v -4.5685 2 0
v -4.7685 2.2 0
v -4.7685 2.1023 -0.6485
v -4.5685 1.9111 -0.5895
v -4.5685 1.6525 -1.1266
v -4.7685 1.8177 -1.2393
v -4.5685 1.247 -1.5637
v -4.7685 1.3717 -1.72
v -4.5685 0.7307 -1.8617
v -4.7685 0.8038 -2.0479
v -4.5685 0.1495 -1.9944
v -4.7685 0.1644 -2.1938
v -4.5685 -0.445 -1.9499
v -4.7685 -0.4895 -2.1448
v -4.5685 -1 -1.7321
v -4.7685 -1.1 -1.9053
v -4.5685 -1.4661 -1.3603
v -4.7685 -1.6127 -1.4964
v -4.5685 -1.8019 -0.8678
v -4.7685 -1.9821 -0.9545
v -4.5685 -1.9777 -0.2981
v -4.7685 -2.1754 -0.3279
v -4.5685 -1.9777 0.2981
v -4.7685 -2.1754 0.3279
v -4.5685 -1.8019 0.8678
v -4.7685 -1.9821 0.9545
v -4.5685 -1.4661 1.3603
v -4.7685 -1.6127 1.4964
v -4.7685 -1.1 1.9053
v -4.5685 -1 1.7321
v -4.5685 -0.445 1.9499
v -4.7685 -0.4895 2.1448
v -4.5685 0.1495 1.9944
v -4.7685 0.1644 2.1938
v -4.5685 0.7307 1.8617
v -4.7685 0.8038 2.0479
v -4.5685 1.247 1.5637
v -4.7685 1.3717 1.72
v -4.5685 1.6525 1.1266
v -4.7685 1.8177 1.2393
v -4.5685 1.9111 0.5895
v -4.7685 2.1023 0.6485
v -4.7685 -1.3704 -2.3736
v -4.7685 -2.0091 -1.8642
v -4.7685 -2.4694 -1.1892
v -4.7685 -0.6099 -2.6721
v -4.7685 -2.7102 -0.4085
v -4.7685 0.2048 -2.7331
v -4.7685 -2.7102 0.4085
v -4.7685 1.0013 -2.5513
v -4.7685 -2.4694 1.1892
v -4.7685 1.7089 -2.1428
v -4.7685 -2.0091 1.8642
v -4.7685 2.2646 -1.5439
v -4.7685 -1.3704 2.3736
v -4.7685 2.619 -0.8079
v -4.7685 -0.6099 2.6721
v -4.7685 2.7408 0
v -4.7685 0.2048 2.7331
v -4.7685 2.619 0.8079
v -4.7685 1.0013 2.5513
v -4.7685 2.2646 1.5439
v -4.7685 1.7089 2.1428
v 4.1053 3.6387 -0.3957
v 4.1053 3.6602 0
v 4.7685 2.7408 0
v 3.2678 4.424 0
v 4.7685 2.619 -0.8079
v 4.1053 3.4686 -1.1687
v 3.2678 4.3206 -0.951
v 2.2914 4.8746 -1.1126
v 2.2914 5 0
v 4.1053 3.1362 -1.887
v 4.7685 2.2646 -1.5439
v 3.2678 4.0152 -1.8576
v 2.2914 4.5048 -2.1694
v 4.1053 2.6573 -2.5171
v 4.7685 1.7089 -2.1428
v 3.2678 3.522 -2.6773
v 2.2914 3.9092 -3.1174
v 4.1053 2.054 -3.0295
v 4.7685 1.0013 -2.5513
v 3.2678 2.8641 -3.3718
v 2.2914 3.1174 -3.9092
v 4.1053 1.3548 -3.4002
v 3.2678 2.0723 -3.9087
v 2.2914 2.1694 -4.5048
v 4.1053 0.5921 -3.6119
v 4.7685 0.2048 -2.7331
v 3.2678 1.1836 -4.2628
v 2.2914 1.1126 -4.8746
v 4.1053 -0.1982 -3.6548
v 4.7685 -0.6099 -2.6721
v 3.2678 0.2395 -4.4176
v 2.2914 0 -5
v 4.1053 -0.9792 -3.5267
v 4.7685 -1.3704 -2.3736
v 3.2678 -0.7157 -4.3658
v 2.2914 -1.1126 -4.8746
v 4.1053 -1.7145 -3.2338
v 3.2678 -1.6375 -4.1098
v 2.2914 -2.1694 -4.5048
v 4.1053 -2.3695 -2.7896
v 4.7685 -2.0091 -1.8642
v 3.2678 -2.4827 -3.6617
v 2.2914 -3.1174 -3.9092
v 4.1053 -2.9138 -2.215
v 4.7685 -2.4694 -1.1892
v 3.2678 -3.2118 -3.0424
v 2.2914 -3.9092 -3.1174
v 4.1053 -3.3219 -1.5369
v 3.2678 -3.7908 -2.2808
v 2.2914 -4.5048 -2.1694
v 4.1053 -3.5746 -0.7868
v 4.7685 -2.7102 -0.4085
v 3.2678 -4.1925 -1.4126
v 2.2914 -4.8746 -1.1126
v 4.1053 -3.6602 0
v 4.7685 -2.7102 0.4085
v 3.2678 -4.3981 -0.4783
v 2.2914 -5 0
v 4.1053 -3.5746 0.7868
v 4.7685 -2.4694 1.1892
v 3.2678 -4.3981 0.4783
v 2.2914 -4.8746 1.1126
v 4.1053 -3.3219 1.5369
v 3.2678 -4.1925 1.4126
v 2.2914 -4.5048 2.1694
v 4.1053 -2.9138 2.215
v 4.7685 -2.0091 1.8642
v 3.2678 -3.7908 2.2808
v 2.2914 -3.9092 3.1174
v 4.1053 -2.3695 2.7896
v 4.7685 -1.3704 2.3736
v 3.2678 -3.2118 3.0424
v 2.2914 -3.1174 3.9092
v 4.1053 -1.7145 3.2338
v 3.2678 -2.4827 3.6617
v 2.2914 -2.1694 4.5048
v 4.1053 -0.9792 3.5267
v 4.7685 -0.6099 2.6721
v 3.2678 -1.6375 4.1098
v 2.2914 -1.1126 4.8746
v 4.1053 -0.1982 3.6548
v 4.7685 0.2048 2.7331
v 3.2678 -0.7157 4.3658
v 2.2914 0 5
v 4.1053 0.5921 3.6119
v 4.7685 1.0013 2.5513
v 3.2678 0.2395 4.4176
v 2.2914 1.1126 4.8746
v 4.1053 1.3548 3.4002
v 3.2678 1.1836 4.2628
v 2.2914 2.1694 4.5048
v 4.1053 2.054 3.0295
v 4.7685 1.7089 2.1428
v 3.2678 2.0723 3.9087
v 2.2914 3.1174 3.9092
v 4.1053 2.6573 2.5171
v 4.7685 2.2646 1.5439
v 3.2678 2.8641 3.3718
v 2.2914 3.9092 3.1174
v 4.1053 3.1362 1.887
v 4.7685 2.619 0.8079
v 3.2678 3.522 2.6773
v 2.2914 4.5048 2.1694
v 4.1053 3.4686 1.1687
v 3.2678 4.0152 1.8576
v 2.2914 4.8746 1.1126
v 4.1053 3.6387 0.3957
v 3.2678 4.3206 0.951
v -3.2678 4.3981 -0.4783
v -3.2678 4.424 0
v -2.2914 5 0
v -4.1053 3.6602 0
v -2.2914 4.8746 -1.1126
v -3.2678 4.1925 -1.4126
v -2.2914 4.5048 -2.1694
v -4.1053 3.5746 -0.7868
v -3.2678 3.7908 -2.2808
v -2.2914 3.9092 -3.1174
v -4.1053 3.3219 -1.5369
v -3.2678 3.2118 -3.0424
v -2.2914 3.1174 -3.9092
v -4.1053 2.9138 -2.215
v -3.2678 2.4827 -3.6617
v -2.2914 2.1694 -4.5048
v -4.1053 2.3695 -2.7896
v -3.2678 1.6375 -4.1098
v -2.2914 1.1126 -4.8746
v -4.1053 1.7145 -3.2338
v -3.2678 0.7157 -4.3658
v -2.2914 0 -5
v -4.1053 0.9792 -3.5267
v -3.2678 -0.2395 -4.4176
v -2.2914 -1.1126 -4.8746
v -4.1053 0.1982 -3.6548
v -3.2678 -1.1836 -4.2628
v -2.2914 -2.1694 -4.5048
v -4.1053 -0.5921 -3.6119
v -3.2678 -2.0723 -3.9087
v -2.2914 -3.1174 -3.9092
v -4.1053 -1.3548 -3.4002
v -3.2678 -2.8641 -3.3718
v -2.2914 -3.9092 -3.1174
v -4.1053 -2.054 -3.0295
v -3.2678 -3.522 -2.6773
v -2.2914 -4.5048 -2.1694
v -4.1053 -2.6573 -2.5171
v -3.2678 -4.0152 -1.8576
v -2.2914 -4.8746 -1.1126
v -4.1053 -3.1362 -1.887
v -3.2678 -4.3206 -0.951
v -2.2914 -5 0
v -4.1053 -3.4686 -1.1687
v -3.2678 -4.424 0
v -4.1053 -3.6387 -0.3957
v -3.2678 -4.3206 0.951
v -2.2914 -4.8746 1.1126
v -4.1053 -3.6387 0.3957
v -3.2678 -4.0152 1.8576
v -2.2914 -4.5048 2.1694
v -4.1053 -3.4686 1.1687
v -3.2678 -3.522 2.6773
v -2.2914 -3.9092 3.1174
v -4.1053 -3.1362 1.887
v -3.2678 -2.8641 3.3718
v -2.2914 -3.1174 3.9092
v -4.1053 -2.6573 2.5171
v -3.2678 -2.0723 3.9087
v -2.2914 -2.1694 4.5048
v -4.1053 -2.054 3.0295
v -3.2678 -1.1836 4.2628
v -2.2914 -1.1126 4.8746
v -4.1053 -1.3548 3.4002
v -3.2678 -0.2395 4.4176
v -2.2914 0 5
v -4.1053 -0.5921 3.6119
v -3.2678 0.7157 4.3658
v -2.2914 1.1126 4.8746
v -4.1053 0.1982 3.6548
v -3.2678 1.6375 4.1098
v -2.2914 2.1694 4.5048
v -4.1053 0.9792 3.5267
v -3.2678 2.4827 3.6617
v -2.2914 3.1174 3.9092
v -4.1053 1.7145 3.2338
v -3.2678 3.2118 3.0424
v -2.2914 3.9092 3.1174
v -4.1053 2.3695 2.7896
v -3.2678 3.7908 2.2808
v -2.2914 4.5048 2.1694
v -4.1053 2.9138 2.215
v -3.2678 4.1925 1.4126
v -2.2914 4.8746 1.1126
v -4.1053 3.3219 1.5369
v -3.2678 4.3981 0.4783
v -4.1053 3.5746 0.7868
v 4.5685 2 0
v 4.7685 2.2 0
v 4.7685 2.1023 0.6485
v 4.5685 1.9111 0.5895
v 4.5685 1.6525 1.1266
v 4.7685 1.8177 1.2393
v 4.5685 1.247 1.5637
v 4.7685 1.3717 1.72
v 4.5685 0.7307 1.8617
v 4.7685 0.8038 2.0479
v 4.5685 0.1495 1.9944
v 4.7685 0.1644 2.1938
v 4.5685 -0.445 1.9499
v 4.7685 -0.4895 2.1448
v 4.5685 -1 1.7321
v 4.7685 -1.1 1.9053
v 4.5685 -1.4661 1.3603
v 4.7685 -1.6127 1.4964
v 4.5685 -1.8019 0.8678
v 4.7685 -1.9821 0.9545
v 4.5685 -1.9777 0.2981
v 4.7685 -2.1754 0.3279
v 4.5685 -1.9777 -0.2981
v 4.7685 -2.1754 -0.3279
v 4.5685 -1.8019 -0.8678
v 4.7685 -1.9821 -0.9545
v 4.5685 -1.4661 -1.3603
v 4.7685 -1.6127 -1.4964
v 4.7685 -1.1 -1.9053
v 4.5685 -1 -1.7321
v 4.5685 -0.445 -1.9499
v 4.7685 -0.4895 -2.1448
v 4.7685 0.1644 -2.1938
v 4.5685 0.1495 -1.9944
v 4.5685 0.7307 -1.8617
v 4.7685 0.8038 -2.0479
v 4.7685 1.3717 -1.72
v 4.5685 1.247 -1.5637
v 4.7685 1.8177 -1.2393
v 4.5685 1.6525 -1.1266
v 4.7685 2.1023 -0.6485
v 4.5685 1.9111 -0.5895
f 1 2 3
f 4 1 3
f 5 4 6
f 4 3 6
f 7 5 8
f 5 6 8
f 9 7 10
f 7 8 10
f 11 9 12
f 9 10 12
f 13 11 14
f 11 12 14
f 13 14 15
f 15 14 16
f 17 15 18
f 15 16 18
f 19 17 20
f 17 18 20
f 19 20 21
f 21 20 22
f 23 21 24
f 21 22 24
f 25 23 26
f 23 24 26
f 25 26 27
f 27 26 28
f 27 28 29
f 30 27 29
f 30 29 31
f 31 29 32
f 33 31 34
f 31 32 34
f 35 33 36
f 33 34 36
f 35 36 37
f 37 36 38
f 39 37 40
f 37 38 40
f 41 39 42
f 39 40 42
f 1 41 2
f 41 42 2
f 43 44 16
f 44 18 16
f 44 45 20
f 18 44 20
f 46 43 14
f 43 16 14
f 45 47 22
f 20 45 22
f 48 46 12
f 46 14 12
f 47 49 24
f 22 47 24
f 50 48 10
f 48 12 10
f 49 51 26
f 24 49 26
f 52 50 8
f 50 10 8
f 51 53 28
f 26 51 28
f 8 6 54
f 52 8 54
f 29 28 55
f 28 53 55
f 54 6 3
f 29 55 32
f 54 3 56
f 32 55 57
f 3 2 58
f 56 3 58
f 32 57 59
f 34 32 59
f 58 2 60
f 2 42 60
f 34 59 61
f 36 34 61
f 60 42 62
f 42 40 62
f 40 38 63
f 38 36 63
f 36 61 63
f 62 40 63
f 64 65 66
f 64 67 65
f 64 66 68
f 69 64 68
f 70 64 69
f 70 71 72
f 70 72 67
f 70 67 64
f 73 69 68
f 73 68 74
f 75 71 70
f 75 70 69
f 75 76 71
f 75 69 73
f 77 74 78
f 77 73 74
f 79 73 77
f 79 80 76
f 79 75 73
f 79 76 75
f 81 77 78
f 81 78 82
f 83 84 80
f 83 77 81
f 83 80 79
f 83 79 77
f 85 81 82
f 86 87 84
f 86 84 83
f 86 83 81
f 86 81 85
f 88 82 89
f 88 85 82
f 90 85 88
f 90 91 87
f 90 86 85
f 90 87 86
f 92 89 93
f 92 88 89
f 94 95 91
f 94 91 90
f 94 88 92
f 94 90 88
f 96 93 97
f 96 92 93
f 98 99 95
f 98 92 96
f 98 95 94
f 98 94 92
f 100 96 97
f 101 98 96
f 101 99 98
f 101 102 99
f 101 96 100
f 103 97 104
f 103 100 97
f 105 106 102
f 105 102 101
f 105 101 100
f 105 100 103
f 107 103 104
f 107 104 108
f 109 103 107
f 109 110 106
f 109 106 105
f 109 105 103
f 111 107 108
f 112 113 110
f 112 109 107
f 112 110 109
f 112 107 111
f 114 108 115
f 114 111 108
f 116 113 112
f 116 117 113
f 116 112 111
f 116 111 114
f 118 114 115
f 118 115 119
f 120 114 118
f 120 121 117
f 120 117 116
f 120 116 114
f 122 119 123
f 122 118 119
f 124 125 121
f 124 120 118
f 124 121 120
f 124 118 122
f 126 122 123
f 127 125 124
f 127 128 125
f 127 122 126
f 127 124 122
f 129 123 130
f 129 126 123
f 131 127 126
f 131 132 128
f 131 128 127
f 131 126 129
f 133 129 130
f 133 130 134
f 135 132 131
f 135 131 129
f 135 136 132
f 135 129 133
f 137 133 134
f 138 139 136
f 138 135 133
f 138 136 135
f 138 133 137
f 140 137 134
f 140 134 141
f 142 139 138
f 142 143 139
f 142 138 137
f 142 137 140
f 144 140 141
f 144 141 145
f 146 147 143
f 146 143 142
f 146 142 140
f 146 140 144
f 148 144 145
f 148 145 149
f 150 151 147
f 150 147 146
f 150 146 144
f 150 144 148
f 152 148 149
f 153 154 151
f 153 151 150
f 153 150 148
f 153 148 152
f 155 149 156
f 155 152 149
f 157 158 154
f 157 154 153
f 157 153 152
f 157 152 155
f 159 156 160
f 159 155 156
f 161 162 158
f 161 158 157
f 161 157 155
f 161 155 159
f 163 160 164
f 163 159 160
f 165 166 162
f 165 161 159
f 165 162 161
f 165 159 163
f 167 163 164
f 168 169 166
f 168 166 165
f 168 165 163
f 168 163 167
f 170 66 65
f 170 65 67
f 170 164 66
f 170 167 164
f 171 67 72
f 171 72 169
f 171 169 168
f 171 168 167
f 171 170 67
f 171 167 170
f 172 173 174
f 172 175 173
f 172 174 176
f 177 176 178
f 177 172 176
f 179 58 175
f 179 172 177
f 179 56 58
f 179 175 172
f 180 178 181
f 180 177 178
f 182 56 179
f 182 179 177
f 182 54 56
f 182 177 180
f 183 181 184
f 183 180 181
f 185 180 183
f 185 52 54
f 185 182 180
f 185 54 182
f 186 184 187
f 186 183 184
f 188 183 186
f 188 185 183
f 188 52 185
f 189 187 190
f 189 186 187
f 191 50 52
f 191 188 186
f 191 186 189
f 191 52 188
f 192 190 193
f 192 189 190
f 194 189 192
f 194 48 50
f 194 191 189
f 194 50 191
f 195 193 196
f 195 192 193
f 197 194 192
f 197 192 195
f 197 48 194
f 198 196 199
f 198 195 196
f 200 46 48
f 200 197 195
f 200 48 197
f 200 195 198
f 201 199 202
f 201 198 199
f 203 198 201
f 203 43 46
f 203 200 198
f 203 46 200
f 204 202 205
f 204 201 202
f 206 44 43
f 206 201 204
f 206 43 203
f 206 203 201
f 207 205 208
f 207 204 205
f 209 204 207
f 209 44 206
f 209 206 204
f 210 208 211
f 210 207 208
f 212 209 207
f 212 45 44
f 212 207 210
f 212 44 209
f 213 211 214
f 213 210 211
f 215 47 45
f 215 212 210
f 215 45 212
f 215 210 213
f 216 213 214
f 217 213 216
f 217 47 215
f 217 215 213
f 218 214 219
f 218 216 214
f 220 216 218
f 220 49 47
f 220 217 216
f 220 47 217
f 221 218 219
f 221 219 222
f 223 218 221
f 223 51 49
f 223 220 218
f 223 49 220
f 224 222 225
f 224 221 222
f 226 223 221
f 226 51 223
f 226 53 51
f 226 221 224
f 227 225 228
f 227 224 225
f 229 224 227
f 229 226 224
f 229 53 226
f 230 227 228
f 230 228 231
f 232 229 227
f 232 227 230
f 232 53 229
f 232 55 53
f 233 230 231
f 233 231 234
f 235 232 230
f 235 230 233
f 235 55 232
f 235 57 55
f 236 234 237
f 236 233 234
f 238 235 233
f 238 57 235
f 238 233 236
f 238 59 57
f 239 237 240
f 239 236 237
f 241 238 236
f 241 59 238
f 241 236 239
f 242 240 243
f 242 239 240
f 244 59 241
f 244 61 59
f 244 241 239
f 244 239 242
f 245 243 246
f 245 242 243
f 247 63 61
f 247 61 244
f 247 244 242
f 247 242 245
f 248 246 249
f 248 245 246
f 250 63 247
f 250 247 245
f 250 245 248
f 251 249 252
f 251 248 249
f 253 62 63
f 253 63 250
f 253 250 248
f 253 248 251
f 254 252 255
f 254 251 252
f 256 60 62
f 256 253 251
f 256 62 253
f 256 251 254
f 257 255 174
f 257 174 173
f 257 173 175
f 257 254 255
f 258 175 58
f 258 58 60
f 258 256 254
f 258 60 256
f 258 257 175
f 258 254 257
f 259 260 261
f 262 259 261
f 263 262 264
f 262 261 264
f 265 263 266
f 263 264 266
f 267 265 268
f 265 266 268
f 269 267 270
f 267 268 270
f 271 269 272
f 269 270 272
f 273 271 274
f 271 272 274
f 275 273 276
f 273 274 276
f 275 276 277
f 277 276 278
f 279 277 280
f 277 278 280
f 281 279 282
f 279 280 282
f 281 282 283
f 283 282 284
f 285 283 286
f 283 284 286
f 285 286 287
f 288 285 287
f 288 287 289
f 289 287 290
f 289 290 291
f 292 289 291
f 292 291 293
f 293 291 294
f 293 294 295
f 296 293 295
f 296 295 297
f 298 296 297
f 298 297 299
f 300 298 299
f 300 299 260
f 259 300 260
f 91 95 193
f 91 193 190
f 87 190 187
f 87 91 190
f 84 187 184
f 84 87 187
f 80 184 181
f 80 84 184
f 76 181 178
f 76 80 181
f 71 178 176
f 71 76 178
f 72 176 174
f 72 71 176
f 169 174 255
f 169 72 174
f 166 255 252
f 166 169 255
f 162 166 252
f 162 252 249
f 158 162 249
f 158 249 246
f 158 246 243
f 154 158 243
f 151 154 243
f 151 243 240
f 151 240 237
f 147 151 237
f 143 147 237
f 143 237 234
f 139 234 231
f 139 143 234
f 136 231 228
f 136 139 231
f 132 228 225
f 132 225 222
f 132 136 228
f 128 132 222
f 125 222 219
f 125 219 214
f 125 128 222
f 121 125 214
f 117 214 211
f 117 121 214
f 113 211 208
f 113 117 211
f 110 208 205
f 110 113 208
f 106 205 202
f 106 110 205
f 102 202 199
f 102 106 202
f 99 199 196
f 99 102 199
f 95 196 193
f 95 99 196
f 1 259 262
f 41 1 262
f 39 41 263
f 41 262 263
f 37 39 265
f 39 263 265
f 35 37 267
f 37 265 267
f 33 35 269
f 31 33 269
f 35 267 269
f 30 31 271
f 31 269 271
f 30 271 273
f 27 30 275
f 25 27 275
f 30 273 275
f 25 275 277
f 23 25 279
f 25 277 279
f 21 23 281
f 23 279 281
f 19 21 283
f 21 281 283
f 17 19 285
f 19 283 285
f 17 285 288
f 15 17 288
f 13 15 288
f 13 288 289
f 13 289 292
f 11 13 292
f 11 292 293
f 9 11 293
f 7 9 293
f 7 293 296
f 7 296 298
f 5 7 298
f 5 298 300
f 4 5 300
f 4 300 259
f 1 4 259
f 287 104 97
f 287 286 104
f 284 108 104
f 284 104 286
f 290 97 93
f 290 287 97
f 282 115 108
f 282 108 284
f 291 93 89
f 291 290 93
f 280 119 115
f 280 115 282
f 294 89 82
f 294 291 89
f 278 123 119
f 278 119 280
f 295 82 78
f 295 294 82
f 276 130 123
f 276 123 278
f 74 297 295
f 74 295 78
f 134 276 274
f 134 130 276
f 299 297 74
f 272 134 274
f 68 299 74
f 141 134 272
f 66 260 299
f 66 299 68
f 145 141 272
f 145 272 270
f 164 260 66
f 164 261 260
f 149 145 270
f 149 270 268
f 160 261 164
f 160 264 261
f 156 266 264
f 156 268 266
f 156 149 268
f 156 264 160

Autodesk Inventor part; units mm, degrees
ref_plane "YZ Plane" through (0, 0, 0) normal (1, 0, 0) x (0, 1, 0)
ref_plane "XZ Plane" through (0, 0, 0) normal (0, 1, 0) x (-1, 0, 0)
ref_plane "XY Plane" through (0, 0, 0) normal (0, 0, 1) x (1, 0, 0)
sketch "Sketch1" plane through (0, 0, 0) normal (0, 0, 1) x (1, 0, 0)
  line L0 (-4.7685, 2) -> (4.7685, 2)
  line L1 (4.7685, 2) -> (4.7685, 2.7408)
  line L2 (-4.7685, 2) -> (-4.7685, 2.7408)
  line L3 (0, 0) -> (2.529, 0)
  arc A0 (4.7685, 2.7408) -> (-4.7685, 2.7408) centre (0, 0) ccw
  dimension "d1" = 2
  dimension "d8" = 11
revolve "Revolution1" add sketch "Sketch1" angle 360 about axis through (0, 0, 0) along (1, 0, 0)
sketch "Sketch2" plane through (4.7685, 0, 0) normal (1, 0, 0) x (0, 0, -1)
  circle A0 centre (0, 0) radius 6
  circle A1 centre (0, 0) radius 2 projected
  circle A2 centre (0, 0) radius 5
  dimension "d5" = 10
extrude "Extrusion1" cut sketch "Sketch2" against normal blind 10 contours A0
chamfer "Chamfer1" distance 0.2 angle 45 2 edges at (4.7685, -2, 0) (-4.7685, -2, 0)
equation "\"BendRadius\" = Thickness"
equation "\"BendReliefWidth\" = Thickness"
equation "\"BendReliefDepth\" = 0.5 * Thickness"
equation "\"CornerReliefSize\" = 4 * Thickness"
equation "\"MinimumRemnant\" = 2 * Thickness"
equation "\"TransitionRadius\" = BendRadius"
equation "\"JacobiRadiusSize\" = BendRadius"
equation "\"GapSize\" = Thickness"
equation "\"Thickness\" = 0.5"
properties part number "mắt trâu"
